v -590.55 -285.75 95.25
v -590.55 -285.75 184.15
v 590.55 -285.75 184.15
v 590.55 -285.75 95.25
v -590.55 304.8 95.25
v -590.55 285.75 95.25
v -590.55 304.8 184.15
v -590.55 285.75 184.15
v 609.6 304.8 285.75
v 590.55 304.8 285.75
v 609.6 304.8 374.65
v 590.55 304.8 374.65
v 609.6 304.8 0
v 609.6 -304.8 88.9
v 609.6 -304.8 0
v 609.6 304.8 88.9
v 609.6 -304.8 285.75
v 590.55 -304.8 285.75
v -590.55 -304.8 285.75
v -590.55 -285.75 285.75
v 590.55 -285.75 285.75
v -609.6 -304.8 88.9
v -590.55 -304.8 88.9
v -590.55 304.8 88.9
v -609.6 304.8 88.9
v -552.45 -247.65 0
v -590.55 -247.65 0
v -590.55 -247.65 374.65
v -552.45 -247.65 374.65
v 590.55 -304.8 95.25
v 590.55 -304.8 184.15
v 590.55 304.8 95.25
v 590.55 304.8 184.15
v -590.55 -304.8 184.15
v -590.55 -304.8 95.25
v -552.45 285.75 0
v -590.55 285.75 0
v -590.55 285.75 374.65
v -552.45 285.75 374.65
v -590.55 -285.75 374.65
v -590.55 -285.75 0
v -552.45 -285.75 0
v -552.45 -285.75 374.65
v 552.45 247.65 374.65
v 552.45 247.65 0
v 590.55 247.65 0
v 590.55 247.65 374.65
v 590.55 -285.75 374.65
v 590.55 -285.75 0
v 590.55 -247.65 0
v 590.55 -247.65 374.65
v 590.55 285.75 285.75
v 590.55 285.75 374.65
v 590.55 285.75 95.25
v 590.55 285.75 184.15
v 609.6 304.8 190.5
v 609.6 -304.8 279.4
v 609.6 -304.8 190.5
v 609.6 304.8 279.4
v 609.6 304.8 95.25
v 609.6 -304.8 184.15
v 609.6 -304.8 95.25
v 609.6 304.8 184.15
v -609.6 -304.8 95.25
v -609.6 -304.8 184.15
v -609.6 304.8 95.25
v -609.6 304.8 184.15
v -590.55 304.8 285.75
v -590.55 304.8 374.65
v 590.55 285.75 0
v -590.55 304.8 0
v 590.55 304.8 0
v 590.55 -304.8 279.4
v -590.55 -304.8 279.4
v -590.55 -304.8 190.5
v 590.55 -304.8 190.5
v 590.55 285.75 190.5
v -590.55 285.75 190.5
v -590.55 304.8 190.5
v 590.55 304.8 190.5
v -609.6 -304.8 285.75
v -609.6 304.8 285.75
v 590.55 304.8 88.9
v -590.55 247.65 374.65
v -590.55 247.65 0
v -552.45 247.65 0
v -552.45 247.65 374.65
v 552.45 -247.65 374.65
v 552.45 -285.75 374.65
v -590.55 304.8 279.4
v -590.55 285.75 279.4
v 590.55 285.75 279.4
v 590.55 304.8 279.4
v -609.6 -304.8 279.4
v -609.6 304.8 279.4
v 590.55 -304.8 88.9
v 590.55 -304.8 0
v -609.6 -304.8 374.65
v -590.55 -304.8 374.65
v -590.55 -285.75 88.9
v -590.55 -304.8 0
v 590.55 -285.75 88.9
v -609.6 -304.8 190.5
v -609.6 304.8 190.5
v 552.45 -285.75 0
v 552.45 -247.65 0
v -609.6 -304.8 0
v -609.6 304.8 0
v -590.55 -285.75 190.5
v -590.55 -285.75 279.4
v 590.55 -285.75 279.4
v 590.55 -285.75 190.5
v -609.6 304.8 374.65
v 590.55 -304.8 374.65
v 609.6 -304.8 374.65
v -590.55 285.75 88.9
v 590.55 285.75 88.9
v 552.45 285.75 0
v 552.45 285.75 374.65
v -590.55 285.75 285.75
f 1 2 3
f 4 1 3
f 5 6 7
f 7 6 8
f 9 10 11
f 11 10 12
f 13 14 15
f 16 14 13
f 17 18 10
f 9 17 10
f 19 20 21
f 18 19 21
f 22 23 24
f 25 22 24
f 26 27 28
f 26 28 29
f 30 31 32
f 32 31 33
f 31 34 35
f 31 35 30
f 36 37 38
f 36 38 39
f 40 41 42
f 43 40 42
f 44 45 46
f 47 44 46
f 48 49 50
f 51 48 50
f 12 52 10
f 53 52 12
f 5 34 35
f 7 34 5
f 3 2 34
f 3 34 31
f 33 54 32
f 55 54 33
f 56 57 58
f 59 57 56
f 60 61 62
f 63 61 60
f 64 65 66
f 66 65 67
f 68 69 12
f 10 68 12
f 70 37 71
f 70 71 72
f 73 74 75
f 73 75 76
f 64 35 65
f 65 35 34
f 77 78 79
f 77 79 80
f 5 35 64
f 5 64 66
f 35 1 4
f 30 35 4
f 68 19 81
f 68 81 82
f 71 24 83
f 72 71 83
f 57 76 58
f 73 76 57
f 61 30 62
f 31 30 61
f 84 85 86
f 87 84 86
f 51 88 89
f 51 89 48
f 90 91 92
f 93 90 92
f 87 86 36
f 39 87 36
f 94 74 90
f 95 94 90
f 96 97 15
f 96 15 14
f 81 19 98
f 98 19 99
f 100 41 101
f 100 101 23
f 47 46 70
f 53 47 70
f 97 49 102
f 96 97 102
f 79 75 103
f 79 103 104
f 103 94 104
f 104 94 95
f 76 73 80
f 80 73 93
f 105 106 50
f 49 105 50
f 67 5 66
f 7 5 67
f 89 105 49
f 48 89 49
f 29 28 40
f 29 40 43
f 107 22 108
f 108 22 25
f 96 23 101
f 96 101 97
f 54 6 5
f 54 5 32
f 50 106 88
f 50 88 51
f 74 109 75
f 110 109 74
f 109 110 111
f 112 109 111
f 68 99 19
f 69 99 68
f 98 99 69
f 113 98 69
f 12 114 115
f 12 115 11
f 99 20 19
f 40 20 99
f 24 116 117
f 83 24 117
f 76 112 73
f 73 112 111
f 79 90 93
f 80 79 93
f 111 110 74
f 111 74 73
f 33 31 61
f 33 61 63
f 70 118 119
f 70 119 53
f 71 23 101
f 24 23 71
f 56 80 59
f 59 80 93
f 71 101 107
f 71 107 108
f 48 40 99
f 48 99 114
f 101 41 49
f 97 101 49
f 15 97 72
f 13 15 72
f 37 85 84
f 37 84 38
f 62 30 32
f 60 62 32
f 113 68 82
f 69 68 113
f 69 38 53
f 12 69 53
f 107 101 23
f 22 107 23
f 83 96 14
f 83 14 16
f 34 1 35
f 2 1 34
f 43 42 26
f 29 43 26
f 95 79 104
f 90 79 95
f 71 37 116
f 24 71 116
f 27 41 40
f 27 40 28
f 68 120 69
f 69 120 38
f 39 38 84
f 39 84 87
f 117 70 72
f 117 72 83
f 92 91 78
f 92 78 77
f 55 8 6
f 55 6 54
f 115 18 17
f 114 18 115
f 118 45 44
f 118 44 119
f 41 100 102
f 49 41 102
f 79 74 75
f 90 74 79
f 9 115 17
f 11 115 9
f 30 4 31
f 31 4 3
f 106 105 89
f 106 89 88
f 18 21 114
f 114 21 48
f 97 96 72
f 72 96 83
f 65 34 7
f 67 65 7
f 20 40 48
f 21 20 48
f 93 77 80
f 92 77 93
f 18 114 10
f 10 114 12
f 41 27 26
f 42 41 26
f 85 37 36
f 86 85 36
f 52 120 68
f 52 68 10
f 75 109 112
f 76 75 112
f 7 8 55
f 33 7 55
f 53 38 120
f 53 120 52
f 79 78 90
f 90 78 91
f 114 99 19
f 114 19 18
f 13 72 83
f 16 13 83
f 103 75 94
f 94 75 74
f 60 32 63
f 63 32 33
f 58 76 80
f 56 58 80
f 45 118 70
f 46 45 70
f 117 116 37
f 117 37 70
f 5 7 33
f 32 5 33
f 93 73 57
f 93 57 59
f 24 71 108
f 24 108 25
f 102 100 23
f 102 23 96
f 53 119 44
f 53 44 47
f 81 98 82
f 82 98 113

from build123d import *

# Parameters (mm, degrees)
SKETCH_W     = 38.1
SKETCH_H     = 38.1
PAD_DEPTH    = 374.65
SKETCH001_W  = 38.1
SKETCH001_H  = 38.1
PAD001_DEPTH = 374.65
SKETCH002_W  = 38.1
SKETCH002_H  = 38.1
PAD002_DEPTH = 374.65
SKETCH003_W  = 38.1
SKETCH003_H  = 38.1
PAD003_DEPTH = 374.65
SKETCH004_W  = 1181.1
SKETCH004_H  = 88.9
PAD004_DEPTH = 19.05
SKETCH012_W  = 1181.1
SKETCH012_H  = 88.9
PAD012_DEPTH = 19.05
SKETCH013_W  = 1181.1
SKETCH013_H  = 88.9
PAD013_DEPTH = 19.05
SKETCH014_W  = 1181.1
SKETCH014_H  = 88.9
PAD014_DEPTH = 19.05
SKETCH008_W  = 609.6
SKETCH008_H  = 88.9
PAD008_DEPTH = 19.05
SKETCH009_W  = 609.6
SKETCH009_H  = 88.9
PAD009_DEPTH = 19.05
SKETCH010_W  = 609.6
SKETCH010_H  = 88.9
PAD010_DEPTH = 19.05
SKETCH011_W  = 609.6
SKETCH011_H  = 88.9
PAD011_DEPTH = 19.05
SKETCH015_W  = 609.6
SKETCH015_H  = 88.9
PAD015_DEPTH = 19.05
SKETCH016_W  = 609.6
SKETCH016_H  = 88.9
PAD016_DEPTH = 19.05
SKETCH017_W  = 609.6
SKETCH017_H  = 88.9
PAD017_DEPTH = 19.05
SKETCH018_W  = 609.6
SKETCH018_H  = 88.9
PAD018_DEPTH = 19.05
SKETCH019_W  = 1181.1
SKETCH019_H  = 88.9
PAD019_DEPTH = 19.05
SKETCH020_W  = 1181.1
SKETCH020_H  = 88.9
PAD020_DEPTH = 19.05
SKETCH021_W  = 1181.1
SKETCH021_H  = 88.9
PAD021_DEPTH = 19.05
SKETCH022_W  = 1181.1
SKETCH022_H  = 88.9
PAD022_DEPTH = 19.05


with BuildPart() as post1:
    # Sketch → Pad (new body)
    with BuildSketch(Plane.XY):
        with Locations((-571.5, 266.7)):
            Rectangle(SKETCH_W, SKETCH_H)
    extrude(amount=PAD_DEPTH)


with BuildPart() as post2:
    # Sketch001 → Pad001 (new body)
    with BuildSketch(Plane.XY):
        with Locations((571.5, 266.7)):
            Rectangle(SKETCH001_W, SKETCH001_H)
    extrude(amount=PAD001_DEPTH)


with BuildPart() as post3:
    # Sketch002 → Pad002 (new body)
    with BuildSketch(Plane.XY):
        with Locations((-571.5, -266.7)):
            Rectangle(SKETCH002_W, SKETCH002_H)
    extrude(amount=PAD002_DEPTH)


with BuildPart() as post4:
    # Sketch003 → Pad003 (new body)
    with BuildSketch(Plane.XY):
        with Locations((571.5, -266.7)):
            Rectangle(SKETCH003_W, SKETCH003_H)
    extrude(amount=PAD003_DEPTH)


with BuildPart() as panelfront1:
    # Sketch004 → Pad004 (new body)
    with BuildSketch(Plane.XZ.offset(285.75)):
        with Locations((0, 44.45)):
            Rectangle(SKETCH004_W, SKETCH004_H)
    extrude(amount=PAD004_DEPTH)


with BuildPart() as panelfront2:
    # Sketch012 → Pad012 (new body)
    with BuildSketch(Plane.XZ.offset(285.75)):
        with Locations((0, 139.7)):
            Rectangle(SKETCH012_W, SKETCH012_H)
    extrude(amount=PAD012_DEPTH)


with BuildPart() as panelfront3:
    # Sketch013 → Pad013 (new body)
    with BuildSketch(Plane.XZ.offset(285.75)):
        with Locations((0, 234.95)):
            Rectangle(SKETCH013_W, SKETCH013_H)
    extrude(amount=PAD013_DEPTH)


with BuildPart() as panelfront4:
    # Sketch014 → Pad014 (new body)
    with BuildSketch(Plane.XZ.offset(285.75)):
        with Locations((0, 330.2)):
            Rectangle(SKETCH014_W, SKETCH014_H)
    extrude(amount=PAD014_DEPTH)


with BuildPart() as panelright1:
    # Sketch008 → Pad008 (new body)
    with BuildSketch(Plane.YZ.offset(590.55)):
        with Locations((0, 44.45)):
            Rectangle(SKETCH008_W, SKETCH008_H)
    extrude(amount=PAD008_DEPTH)


with BuildPart() as panelright2:
    # Sketch009 → Pad009 (new body)
    with BuildSketch(Plane.YZ.offset(590.55)):
        with Locations((0, 139.7)):
            Rectangle(SKETCH009_W, SKETCH009_H)
    extrude(amount=PAD009_DEPTH)


with BuildPart() as panelright3:
    # Sketch010 → Pad010 (new body)
    with BuildSketch(Plane.YZ.offset(590.55)):
        with Locations((0, 234.95)):
            Rectangle(SKETCH010_W, SKETCH010_H)
    extrude(amount=PAD010_DEPTH)


with BuildPart() as panelright4:
    # Sketch011 → Pad011 (new body)
    with BuildSketch(Plane.YZ.offset(590.55)):
        with Locations((0, 330.2)):
            Rectangle(SKETCH011_W, SKETCH011_H)
    extrude(amount=PAD011_DEPTH)


with BuildPart() as panelleft1:
    # Sketch015 → Pad015 (new body)
    with BuildSketch(Plane.YZ.offset(-590.55)):
        with Locations((0, 44.45)):
            Rectangle(SKETCH015_W, SKETCH015_H)
    extrude(amount=-PAD015_DEPTH)


with BuildPart() as panelleft2:
    # Sketch016 → Pad016 (new body)
    with BuildSketch(Plane.YZ.offset(-590.55)):
        with Locations((0, 139.7)):
            Rectangle(SKETCH016_W, SKETCH016_H)
    extrude(amount=-PAD016_DEPTH)


with BuildPart() as panelleft3:
    # Sketch017 → Pad017 (new body)
    with BuildSketch(Plane.YZ.offset(-590.55)):
        with Locations((0, 234.95)):
            Rectangle(SKETCH017_W, SKETCH017_H)
    extrude(amount=-PAD017_DEPTH)


with BuildPart() as panelleft4:
    # Sketch018 → Pad018 (new body)
    with BuildSketch(Plane.YZ.offset(-590.55)):
        with Locations((0, 330.2)):
            Rectangle(SKETCH018_W, SKETCH018_H)
    extrude(amount=-PAD018_DEPTH)


with BuildPart() as panelrear1:
    # Sketch019 → Pad019 (new body)
    with BuildSketch(Plane.XZ.offset(-285.75)):
        with Locations((0, 44.45)):
            Rectangle(SKETCH019_W, SKETCH019_H)
    extrude(amount=-PAD019_DEPTH)


with BuildPart() as panelrear2:
    # Sketch020 → Pad020 (new body)
    with BuildSketch(Plane.XZ.offset(-285.75)):
        with Locations((0, 139.7)):
            Rectangle(SKETCH020_W, SKETCH020_H)
    extrude(amount=-PAD020_DEPTH)


with BuildPart() as panelrear3:
    # Sketch021 → Pad021 (new body)
    with BuildSketch(Plane.XZ.offset(-285.75)):
        with Locations((0, 234.95)):
            Rectangle(SKETCH021_W, SKETCH021_H)
    extrude(amount=-PAD021_DEPTH)


with BuildPart() as panelrear4:
    # Sketch022 → Pad022 (new body)
    with BuildSketch(Plane.XZ.offset(-285.75)):
        with Locations((0, 330.2)):
            Rectangle(SKETCH022_W, SKETCH022_H)
    extrude(amount=-PAD022_DEPTH)


solid = Compound([post1.part, post2.part, post3.part, post4.part, panelfront1.part, panelfront2.part, panelfront3.part, panelfront4.part, panelright1.part, panelright2.part, panelright3.part, panelright4.part, panelleft1.part, panelleft2.part, panelleft3.part, panelleft4.part, panelrear1.part, panelrear2.part, panelrear3.part, panelrear4.part])
